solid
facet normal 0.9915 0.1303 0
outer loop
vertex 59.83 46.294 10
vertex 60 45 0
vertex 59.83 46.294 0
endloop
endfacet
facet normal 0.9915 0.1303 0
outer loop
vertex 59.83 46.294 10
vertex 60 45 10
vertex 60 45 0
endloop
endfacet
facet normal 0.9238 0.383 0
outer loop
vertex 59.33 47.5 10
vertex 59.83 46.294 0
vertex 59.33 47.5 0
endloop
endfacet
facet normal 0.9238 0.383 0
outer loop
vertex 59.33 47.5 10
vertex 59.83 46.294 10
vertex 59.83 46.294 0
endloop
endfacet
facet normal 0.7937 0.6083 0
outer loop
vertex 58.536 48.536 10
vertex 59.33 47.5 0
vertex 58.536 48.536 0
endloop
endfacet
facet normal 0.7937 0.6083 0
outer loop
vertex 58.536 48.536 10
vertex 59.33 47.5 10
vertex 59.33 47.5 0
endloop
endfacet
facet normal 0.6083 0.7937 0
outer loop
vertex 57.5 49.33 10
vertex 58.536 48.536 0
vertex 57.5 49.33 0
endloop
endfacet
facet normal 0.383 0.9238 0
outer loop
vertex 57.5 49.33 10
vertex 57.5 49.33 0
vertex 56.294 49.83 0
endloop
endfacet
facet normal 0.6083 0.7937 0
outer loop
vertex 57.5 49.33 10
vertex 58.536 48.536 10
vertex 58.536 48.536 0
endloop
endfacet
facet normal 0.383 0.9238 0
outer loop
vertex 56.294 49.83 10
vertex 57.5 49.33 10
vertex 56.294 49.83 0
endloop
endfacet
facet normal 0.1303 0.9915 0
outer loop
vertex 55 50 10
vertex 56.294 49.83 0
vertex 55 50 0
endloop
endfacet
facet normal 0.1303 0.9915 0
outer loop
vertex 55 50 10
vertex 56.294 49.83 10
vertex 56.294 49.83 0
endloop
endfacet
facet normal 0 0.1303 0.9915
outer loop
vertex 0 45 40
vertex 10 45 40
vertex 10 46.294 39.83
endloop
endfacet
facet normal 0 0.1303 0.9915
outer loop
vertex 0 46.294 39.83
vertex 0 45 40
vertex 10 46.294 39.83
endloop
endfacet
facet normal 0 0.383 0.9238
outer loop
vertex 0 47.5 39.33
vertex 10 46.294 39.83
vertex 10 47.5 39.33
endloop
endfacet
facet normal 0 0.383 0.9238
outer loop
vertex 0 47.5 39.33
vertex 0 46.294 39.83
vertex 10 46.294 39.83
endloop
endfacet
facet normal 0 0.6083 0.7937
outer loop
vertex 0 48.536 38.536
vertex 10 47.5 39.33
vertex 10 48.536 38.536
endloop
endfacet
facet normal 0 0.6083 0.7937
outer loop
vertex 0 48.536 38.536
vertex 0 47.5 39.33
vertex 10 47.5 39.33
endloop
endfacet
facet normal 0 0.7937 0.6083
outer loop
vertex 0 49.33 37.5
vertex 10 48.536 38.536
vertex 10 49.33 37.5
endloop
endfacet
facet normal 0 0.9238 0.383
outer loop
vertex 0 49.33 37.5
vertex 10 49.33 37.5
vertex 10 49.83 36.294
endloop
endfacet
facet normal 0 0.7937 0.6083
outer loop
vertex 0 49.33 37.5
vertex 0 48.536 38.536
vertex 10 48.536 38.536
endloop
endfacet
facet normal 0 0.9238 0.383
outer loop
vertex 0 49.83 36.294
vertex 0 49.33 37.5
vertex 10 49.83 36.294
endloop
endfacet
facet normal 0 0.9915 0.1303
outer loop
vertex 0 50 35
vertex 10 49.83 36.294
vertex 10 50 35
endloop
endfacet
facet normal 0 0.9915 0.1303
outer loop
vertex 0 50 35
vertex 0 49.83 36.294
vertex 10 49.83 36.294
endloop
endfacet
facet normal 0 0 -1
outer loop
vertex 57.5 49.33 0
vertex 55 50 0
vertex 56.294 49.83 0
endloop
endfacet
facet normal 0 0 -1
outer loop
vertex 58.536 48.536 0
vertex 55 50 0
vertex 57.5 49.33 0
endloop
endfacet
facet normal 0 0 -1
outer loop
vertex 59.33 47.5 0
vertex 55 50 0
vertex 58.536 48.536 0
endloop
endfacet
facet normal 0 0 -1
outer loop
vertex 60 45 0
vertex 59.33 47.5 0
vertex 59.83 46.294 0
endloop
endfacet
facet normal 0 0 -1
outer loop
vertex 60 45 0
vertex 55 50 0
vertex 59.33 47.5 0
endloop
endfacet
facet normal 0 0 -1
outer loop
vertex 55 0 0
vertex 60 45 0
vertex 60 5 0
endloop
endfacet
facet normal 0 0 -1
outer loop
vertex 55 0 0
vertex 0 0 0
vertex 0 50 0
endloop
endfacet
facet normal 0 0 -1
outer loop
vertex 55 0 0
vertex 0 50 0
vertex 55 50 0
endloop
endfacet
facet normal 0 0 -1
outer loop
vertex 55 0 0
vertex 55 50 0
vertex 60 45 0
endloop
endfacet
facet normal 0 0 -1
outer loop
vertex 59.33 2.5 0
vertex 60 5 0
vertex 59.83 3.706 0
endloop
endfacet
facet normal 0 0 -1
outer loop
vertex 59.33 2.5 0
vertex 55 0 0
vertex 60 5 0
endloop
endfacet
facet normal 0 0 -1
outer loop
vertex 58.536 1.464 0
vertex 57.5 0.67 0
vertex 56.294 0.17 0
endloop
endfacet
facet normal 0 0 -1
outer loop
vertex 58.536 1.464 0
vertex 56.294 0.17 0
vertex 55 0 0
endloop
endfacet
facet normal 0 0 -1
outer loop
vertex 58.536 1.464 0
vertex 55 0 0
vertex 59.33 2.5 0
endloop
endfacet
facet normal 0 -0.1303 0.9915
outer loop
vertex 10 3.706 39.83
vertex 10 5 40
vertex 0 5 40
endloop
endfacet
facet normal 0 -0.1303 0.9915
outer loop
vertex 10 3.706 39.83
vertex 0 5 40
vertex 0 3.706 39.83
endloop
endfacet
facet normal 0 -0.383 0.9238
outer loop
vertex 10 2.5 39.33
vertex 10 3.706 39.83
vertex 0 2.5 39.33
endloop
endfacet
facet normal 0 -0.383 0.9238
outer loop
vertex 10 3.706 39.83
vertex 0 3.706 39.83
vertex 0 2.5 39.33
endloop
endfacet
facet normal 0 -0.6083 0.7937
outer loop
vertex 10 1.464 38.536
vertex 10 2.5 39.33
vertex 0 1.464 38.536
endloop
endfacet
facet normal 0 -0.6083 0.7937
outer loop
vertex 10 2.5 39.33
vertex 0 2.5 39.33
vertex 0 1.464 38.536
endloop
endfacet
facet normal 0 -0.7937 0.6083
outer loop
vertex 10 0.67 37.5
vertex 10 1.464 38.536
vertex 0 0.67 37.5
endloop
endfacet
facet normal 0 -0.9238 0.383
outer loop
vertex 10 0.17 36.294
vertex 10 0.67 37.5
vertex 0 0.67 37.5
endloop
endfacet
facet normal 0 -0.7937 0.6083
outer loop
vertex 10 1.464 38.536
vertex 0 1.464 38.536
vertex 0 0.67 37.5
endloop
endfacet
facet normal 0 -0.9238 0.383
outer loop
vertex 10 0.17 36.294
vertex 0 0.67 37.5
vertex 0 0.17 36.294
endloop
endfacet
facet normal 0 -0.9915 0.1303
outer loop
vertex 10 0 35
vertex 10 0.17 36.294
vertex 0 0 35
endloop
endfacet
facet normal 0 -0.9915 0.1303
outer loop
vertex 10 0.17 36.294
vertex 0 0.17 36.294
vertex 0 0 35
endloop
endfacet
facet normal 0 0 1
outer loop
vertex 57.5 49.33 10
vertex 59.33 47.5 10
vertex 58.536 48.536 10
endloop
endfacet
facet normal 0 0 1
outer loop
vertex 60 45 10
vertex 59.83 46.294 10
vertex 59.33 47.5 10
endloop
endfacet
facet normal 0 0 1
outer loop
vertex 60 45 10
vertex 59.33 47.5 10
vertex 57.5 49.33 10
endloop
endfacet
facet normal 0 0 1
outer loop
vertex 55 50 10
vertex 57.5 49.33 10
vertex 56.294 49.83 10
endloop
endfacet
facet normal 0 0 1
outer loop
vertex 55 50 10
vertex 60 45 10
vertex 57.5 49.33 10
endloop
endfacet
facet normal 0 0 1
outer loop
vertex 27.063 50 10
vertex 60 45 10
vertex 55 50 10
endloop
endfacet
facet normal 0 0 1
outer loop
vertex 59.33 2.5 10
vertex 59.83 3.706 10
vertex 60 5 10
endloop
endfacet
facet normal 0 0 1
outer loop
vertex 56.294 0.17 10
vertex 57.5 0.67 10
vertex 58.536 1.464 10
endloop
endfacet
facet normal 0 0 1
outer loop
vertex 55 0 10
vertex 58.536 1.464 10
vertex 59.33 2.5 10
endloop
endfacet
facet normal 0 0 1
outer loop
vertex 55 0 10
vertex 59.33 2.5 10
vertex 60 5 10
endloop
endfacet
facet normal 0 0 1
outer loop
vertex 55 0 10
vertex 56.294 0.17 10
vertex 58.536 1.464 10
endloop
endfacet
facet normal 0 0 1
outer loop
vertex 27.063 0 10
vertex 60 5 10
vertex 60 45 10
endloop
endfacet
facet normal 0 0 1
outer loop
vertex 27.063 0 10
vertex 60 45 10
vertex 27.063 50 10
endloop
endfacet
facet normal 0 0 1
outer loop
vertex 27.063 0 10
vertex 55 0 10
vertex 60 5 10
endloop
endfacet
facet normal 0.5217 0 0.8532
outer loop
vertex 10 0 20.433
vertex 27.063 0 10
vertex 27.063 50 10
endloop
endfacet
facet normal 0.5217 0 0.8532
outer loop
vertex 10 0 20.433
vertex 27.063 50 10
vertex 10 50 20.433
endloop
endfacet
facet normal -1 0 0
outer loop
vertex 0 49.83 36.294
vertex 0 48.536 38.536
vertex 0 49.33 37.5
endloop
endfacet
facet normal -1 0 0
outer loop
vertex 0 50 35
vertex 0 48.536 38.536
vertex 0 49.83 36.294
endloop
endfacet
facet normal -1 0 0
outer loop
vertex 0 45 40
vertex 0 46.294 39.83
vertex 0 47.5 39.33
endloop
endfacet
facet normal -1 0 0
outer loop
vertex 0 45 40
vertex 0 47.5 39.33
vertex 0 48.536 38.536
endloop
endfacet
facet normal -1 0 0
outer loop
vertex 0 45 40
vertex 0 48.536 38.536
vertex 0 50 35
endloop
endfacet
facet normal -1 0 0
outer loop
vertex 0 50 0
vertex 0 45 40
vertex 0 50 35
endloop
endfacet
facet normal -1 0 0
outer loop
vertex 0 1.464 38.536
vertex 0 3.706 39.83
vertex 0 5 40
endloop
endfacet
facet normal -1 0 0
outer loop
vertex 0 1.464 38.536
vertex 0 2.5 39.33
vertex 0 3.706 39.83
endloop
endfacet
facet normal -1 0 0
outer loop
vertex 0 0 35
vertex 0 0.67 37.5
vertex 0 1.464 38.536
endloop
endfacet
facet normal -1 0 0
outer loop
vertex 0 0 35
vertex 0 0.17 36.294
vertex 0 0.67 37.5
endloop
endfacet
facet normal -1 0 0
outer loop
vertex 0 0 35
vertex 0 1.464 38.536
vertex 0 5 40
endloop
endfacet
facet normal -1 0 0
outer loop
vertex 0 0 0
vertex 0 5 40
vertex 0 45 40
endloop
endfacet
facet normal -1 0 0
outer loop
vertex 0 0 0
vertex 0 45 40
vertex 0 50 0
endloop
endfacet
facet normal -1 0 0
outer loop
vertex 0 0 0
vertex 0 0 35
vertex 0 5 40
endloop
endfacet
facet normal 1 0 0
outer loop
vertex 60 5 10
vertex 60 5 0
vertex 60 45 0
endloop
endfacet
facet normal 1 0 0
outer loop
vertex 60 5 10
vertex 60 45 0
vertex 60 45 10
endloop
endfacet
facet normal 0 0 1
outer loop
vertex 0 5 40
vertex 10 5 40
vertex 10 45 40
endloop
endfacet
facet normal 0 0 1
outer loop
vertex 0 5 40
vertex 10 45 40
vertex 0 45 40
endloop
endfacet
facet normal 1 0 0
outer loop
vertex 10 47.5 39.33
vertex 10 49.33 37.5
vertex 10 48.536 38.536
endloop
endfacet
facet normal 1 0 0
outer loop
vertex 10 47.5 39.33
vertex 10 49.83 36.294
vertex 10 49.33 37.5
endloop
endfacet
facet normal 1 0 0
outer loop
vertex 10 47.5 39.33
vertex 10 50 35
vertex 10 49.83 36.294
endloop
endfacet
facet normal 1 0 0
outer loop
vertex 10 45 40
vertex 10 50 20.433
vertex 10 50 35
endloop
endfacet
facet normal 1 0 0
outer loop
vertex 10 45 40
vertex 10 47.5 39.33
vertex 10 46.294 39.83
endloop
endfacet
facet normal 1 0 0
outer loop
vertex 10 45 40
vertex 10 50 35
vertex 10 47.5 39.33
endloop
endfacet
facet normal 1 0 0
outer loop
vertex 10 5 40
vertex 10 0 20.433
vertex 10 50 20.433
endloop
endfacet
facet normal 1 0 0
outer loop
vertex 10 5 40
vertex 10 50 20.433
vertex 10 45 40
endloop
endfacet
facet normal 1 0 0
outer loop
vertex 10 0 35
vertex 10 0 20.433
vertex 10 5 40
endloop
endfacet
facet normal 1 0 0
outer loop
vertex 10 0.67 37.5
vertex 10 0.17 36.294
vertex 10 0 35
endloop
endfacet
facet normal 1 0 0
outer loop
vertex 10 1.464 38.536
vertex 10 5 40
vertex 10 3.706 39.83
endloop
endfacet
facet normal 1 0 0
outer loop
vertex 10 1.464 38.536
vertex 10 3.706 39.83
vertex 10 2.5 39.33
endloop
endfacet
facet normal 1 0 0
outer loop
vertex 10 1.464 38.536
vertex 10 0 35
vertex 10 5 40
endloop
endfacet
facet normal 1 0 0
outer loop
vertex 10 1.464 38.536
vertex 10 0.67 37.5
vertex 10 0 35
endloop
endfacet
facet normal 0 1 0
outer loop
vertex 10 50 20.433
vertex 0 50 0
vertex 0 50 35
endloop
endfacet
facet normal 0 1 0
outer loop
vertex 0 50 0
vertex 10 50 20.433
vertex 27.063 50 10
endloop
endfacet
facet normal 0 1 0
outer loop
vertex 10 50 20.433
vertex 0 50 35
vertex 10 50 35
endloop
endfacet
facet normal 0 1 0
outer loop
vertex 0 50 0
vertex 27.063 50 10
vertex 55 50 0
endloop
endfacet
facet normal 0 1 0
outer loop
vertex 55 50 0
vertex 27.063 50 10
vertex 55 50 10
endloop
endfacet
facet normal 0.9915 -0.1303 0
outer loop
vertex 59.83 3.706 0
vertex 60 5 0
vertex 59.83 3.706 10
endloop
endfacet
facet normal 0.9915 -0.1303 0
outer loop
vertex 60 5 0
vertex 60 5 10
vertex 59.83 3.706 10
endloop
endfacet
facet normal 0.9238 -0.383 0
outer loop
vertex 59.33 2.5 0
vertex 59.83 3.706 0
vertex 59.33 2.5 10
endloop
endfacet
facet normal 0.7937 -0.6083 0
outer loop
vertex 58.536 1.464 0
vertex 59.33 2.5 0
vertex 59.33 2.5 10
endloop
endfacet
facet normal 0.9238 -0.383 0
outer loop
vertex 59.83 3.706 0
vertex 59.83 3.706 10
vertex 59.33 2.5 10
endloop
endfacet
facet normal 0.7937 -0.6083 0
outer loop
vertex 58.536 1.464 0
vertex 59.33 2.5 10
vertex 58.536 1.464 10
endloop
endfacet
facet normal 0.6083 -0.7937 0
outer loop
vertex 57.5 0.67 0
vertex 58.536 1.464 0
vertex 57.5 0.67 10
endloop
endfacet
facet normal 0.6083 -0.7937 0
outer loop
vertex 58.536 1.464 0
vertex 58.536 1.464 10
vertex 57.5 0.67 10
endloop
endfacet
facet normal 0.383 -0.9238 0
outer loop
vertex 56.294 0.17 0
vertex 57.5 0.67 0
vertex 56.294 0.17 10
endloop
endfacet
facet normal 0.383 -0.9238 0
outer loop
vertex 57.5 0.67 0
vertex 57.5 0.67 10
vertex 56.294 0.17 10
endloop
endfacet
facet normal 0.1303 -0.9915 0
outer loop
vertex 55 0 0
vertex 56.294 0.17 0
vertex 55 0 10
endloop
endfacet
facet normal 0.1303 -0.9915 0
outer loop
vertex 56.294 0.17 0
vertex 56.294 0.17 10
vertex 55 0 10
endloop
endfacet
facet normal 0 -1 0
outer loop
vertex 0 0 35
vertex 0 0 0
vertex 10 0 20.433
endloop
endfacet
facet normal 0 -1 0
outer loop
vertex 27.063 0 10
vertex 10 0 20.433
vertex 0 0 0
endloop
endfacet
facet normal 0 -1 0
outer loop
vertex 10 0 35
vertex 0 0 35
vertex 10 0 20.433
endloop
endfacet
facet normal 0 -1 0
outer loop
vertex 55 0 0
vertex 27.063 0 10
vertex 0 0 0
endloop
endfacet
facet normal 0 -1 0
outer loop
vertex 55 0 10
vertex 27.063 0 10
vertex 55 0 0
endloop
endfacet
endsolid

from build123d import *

# Parameters (mm, degrees)
F1_DEPTH = 50
F2_R     = 5


with BuildPart() as f1:
    # F0 (on Front) → F1 (new body)
    with BuildSketch(Plane.XZ):
        Polygon((0, 40), (0, 0), (60, 0), (60, 10), (27.063251, 10), (10, 20.432902), (10, 40), align=None)
    extrude(amount=-F1_DEPTH)

    # F2
    f2_edges = [f1.edges().sort_by_distance(p)[0] for p in [
        (5, 0, 40),
        (5, 50, 40),
        (60, 0, 5),
        (60, 50, 5),
    ]]
    fillet(f2_edges, radius=F2_R)


solid = f1.part
